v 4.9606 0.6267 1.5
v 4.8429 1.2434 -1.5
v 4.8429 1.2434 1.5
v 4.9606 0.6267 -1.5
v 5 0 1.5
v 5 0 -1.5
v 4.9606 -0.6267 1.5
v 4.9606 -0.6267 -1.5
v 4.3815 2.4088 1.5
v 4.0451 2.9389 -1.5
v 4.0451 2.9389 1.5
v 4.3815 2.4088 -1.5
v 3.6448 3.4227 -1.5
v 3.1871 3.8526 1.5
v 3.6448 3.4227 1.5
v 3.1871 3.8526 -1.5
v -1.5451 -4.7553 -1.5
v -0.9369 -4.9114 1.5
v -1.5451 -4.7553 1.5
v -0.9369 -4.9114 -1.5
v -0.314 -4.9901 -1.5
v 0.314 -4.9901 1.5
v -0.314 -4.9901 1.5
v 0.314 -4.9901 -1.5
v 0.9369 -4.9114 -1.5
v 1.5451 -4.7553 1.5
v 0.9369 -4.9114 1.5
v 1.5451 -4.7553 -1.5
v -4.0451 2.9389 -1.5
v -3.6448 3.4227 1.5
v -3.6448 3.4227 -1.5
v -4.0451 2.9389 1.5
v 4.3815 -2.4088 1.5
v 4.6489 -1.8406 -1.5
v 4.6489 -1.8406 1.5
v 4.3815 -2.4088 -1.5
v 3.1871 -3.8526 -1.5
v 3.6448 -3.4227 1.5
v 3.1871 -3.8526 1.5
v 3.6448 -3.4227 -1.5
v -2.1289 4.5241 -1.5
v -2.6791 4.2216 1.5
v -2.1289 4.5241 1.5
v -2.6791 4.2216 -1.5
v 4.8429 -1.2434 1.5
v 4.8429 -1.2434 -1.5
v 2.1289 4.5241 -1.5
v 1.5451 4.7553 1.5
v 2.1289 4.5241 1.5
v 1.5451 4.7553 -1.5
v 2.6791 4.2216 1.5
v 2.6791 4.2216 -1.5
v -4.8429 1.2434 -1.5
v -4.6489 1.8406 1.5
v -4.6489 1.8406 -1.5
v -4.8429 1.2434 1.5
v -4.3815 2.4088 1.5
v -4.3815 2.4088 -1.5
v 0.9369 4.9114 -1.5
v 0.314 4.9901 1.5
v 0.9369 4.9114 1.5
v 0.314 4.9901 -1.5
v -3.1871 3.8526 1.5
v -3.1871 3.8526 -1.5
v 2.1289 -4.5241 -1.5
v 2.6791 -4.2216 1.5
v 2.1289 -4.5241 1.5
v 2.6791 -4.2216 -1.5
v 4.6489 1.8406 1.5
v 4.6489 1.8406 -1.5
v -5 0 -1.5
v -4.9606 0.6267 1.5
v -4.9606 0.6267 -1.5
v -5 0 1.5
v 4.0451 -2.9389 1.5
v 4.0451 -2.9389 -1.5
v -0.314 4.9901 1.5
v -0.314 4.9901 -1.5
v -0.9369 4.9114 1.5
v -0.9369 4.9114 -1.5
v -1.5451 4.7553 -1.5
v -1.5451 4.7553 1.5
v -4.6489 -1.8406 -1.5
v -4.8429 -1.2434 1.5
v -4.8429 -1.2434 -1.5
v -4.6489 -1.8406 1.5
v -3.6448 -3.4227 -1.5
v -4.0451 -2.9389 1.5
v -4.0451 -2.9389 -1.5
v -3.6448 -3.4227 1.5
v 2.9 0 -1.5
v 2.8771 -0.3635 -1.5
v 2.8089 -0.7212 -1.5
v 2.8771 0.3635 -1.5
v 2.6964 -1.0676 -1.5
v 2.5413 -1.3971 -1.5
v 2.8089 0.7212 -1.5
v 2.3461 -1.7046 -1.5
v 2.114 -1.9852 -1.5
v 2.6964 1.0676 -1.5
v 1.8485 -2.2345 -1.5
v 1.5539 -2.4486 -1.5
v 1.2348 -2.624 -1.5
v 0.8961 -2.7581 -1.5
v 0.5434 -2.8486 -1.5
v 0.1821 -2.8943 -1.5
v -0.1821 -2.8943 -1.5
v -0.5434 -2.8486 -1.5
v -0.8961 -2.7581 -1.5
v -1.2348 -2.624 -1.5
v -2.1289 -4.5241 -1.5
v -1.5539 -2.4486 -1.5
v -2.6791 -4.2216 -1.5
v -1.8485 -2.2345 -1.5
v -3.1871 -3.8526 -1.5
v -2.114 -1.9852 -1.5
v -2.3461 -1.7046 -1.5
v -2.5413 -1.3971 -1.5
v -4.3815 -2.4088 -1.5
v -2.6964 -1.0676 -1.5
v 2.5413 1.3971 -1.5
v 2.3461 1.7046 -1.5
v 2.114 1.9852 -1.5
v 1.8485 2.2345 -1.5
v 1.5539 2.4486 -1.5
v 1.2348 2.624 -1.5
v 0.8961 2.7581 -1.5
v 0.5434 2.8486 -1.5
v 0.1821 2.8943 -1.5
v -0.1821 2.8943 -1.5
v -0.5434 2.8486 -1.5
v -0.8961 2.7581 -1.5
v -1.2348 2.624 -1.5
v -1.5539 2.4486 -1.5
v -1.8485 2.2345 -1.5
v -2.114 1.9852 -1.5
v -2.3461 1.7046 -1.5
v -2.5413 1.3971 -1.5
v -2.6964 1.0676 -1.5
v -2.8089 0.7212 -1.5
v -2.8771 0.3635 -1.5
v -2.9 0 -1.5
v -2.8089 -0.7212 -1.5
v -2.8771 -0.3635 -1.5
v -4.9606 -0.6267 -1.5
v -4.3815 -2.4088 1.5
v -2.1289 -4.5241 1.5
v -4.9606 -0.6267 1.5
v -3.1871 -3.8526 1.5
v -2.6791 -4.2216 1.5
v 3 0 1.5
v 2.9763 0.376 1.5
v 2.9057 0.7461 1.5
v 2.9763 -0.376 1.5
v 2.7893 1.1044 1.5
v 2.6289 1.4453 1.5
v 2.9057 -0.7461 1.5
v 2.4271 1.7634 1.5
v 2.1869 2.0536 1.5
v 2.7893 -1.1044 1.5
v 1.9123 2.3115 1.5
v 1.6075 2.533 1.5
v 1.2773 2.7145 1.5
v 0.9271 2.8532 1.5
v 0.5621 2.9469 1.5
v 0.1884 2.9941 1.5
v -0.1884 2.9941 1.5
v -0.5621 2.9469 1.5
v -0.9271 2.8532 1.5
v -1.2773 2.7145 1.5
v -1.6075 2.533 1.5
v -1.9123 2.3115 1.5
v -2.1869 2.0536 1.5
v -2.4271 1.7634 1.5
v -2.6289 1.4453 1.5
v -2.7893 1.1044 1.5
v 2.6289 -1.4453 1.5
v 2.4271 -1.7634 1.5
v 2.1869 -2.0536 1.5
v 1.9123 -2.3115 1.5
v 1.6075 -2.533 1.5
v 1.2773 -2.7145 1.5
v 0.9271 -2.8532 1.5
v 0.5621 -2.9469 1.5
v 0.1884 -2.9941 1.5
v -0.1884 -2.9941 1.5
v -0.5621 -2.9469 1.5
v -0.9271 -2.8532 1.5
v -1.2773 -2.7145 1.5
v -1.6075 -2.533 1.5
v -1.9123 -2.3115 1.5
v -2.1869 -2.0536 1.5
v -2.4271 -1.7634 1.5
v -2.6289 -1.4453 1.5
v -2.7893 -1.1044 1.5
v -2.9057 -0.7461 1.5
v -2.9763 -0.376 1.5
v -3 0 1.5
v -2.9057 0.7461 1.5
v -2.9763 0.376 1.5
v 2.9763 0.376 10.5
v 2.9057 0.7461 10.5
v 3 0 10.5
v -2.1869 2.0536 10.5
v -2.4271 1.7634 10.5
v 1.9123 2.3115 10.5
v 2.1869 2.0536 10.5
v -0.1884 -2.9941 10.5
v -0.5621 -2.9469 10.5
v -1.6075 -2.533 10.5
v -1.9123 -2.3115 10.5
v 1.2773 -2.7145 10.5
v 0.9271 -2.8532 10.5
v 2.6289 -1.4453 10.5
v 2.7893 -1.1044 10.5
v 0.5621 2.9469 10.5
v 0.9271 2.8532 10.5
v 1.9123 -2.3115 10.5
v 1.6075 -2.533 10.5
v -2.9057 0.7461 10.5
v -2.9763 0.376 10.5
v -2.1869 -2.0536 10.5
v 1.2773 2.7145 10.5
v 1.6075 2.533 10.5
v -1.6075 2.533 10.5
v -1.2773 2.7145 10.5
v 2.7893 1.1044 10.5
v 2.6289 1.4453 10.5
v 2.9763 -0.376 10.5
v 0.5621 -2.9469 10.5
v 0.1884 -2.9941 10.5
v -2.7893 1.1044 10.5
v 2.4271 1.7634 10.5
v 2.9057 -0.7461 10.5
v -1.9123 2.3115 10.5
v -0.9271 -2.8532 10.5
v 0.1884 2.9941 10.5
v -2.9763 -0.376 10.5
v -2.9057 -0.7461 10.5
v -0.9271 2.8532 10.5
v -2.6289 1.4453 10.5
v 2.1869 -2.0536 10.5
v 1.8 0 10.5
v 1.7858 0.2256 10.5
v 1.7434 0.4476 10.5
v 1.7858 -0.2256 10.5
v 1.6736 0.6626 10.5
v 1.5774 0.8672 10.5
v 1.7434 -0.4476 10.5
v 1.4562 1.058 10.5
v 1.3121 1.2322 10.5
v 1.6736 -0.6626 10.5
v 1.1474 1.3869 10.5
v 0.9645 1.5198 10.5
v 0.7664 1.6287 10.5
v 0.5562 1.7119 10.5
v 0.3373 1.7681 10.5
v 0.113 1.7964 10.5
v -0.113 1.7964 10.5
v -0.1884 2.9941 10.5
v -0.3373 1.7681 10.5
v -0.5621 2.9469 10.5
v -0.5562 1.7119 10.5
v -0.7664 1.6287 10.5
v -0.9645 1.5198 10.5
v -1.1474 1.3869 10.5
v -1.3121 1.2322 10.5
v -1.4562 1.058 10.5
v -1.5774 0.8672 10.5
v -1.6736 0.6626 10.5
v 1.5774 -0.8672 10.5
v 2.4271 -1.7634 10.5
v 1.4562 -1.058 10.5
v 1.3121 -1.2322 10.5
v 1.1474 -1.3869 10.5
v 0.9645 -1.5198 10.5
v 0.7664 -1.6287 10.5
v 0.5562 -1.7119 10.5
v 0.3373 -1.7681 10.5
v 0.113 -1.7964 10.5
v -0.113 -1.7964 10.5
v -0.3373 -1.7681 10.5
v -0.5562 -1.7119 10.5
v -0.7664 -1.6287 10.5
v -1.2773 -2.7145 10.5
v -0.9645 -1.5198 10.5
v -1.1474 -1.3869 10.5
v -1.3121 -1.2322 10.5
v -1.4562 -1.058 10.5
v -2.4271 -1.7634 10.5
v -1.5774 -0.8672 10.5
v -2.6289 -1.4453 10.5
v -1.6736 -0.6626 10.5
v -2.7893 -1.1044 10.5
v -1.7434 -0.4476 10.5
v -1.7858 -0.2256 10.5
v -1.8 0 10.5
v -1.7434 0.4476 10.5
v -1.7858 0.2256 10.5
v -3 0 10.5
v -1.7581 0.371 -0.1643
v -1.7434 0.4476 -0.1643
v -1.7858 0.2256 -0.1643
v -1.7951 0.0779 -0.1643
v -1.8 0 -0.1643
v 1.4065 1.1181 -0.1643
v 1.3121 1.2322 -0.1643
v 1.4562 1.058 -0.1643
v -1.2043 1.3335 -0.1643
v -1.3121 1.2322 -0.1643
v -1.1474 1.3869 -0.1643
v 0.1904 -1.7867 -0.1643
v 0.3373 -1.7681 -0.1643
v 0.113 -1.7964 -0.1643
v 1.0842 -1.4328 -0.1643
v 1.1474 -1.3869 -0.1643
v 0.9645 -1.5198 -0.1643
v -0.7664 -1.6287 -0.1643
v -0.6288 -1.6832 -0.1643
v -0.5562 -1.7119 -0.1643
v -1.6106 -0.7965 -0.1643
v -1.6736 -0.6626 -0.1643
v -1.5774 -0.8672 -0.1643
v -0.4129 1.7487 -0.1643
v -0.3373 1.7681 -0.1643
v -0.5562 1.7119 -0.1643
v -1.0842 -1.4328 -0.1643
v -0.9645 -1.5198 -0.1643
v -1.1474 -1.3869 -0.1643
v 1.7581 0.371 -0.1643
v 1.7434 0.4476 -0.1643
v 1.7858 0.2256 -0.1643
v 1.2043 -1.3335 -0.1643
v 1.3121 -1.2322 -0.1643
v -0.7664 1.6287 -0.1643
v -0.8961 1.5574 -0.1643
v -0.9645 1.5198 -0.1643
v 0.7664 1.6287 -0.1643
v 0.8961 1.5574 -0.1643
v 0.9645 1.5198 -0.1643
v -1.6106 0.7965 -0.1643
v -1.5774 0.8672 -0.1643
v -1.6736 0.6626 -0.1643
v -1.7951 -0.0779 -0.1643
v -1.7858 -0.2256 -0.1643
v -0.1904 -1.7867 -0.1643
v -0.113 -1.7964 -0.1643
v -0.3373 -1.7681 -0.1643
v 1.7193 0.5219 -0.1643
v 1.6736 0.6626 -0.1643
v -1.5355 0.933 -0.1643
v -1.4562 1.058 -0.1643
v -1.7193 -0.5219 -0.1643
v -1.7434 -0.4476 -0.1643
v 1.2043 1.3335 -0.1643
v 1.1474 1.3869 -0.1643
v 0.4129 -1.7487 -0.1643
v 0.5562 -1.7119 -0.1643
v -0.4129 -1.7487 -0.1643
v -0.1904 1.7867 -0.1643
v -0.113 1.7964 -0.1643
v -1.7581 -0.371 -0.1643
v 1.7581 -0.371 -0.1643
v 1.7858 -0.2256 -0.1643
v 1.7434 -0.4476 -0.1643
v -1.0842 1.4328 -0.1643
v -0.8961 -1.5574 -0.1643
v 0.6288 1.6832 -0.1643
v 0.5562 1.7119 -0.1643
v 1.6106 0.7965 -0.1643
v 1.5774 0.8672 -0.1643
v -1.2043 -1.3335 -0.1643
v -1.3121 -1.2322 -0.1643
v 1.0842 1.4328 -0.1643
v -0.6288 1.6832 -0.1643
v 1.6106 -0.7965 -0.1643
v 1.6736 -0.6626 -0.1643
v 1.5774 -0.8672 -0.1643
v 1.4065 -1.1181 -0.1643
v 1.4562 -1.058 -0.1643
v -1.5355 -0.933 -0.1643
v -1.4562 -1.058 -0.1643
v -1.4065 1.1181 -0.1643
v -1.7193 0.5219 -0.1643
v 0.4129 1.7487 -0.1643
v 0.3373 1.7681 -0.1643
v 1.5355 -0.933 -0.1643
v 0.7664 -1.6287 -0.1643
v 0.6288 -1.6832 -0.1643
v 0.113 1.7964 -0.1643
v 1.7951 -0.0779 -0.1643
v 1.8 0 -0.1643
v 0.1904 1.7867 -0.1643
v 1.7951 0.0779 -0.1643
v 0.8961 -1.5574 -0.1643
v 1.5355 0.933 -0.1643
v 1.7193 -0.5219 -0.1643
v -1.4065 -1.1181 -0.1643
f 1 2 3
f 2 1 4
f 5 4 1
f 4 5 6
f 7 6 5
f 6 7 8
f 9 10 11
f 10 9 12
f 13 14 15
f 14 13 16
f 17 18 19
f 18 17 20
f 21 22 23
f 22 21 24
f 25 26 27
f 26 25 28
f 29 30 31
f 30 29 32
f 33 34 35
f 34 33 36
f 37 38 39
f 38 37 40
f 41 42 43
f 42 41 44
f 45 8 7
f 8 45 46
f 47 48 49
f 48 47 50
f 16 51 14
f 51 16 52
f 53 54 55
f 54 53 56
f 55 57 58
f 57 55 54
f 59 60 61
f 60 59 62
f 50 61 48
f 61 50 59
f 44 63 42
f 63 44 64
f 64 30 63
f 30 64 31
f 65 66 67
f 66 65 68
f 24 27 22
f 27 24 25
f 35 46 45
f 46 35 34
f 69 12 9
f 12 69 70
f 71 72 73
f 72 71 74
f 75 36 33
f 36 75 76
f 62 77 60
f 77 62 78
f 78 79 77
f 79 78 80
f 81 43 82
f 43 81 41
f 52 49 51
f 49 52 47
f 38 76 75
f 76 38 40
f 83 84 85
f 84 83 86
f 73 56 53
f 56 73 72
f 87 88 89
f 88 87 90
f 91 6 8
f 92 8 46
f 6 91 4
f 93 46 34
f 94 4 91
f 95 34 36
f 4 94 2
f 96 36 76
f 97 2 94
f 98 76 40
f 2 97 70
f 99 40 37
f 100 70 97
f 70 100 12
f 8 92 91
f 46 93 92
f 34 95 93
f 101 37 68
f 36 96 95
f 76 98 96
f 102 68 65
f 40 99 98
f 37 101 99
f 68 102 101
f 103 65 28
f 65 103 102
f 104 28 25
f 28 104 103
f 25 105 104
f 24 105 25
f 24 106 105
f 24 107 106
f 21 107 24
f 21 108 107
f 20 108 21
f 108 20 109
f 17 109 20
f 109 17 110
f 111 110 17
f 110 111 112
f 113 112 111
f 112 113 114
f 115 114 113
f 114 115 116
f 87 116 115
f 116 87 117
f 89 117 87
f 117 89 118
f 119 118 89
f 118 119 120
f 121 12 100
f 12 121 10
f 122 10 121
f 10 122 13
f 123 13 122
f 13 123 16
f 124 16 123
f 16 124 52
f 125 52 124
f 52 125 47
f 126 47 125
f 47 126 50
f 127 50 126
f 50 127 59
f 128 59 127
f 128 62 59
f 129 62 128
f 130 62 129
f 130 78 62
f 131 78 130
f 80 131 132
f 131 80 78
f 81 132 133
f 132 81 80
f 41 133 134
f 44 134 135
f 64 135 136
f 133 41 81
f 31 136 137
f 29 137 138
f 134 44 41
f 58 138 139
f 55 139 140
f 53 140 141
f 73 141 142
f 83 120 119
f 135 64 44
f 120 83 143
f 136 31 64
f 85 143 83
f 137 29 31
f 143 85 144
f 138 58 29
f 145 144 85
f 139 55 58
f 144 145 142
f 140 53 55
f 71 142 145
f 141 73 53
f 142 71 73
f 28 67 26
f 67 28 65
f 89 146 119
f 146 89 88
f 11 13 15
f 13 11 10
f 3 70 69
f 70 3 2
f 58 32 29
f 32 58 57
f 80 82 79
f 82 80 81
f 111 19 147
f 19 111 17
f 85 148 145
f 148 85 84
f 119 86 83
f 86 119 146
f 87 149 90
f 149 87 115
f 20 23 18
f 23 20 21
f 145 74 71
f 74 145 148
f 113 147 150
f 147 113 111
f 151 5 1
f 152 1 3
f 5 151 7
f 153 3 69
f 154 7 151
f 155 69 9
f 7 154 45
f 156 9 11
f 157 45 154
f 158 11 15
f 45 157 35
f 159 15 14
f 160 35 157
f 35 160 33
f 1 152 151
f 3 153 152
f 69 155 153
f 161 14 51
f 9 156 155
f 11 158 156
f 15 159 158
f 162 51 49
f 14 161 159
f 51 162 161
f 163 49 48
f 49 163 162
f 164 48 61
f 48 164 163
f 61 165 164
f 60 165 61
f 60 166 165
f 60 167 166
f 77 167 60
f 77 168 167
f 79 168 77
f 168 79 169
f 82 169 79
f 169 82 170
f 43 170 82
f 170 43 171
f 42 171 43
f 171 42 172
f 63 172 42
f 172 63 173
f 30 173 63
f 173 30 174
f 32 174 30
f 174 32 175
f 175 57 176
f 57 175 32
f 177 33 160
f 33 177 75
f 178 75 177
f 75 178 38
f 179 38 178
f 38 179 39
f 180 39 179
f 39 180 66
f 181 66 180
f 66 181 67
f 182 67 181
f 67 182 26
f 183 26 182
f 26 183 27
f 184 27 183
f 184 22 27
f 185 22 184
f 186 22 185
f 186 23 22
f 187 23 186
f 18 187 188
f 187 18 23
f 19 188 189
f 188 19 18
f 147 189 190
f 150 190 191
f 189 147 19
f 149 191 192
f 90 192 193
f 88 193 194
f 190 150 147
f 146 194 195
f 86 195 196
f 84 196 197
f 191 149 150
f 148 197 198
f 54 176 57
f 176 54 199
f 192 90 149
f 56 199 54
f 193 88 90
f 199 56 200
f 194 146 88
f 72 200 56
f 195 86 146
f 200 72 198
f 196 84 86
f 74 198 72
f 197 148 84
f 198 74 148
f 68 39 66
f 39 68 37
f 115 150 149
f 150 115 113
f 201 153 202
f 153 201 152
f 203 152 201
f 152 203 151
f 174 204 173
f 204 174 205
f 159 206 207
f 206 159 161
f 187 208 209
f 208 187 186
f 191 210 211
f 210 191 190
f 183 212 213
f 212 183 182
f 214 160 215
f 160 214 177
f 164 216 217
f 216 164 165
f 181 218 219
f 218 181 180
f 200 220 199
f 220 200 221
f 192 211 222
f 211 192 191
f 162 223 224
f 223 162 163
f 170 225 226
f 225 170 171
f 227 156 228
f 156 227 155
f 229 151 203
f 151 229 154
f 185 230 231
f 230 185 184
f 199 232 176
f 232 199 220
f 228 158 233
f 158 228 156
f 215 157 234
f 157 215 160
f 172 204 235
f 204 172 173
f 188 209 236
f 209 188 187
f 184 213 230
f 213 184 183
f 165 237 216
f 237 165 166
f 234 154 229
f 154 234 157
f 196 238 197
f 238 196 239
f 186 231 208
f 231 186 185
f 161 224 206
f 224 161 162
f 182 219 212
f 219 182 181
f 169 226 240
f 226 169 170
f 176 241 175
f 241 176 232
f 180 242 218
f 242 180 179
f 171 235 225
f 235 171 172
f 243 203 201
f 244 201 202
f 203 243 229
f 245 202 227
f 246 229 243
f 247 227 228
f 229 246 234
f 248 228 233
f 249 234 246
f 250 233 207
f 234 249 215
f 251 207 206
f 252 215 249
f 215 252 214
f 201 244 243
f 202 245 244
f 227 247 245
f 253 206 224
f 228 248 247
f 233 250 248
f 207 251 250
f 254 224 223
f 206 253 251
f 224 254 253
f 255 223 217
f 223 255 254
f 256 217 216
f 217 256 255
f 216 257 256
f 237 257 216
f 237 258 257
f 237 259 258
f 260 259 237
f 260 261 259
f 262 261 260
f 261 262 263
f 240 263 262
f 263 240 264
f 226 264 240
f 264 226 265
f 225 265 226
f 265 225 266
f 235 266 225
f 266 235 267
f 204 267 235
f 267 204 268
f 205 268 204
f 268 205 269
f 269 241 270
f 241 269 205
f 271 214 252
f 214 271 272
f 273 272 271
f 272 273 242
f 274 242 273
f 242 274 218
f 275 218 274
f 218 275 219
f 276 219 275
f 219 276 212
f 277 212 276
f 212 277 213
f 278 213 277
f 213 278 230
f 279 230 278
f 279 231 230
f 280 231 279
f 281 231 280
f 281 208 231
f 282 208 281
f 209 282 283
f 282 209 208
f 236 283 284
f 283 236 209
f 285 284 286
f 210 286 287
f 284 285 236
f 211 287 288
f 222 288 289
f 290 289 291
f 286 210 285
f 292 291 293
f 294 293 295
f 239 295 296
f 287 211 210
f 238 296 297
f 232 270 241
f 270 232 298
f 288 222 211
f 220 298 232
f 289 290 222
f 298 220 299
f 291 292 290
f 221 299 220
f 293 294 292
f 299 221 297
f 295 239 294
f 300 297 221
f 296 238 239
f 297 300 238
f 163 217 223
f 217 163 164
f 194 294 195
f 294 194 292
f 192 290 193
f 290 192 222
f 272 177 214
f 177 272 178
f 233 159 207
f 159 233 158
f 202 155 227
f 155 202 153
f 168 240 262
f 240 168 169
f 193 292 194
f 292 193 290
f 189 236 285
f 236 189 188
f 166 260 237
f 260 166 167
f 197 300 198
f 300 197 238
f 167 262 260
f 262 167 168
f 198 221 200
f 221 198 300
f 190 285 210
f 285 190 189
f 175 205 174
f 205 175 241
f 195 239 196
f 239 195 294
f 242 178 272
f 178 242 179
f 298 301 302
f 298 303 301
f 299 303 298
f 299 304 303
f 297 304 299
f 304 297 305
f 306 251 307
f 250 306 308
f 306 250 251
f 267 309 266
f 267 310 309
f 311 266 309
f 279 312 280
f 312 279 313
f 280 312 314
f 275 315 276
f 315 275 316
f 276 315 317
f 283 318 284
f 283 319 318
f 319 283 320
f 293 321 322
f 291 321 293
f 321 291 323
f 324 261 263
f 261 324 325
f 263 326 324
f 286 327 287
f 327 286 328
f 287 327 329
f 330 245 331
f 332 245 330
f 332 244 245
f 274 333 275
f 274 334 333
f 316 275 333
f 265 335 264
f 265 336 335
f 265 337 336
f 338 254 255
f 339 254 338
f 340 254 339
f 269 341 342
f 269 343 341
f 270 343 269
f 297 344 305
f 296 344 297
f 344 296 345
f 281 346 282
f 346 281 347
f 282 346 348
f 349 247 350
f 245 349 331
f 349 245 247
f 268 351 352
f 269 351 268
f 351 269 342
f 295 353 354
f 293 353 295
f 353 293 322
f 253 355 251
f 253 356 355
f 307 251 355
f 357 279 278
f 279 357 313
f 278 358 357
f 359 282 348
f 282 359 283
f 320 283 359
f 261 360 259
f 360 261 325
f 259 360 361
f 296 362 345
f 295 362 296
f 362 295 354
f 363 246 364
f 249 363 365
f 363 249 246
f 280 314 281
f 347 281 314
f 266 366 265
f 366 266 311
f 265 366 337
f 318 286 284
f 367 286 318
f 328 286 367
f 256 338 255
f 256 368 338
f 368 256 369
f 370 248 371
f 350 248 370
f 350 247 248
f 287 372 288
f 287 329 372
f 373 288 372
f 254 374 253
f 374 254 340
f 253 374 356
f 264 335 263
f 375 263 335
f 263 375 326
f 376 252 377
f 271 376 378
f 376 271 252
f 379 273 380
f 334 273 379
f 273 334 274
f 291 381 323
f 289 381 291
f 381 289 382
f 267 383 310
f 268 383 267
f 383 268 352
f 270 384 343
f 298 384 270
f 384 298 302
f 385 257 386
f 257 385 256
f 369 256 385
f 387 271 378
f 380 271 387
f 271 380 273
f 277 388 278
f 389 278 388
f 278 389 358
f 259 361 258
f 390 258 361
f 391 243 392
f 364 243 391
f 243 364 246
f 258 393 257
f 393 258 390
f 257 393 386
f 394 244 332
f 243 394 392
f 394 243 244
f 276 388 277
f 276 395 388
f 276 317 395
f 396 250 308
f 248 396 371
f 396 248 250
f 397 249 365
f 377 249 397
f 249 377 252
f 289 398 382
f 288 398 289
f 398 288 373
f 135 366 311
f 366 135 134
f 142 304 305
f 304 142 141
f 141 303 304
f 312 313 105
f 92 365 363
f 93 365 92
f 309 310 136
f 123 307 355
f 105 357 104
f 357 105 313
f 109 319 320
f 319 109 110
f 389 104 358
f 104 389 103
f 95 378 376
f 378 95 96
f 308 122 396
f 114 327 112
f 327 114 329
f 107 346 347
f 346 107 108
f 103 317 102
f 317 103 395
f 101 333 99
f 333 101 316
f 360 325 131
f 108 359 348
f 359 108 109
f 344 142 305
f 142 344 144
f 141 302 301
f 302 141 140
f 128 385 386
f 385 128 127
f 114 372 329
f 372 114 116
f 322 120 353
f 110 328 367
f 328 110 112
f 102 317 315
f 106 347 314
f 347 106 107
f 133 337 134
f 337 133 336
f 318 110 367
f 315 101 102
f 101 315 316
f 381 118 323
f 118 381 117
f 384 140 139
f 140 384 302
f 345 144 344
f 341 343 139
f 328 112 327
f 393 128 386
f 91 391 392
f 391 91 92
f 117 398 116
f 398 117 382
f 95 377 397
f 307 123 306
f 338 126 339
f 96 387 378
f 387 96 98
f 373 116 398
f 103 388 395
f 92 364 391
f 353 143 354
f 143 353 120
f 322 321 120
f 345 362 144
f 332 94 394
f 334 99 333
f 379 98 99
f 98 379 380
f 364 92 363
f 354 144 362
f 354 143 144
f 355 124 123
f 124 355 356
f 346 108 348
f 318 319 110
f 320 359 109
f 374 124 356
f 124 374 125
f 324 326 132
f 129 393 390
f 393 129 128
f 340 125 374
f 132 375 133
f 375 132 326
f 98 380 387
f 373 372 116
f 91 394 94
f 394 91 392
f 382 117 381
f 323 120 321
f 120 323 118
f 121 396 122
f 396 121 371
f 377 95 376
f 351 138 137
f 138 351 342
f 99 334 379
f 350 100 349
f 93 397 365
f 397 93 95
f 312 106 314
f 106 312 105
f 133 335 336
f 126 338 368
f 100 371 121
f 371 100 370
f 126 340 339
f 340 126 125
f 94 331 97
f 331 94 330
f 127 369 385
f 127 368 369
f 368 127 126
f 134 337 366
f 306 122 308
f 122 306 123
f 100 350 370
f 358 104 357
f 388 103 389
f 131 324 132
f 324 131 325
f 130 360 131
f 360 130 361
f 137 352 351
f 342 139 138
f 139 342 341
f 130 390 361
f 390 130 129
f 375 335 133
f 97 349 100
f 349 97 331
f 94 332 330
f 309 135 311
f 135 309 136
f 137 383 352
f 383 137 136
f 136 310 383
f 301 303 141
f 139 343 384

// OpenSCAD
$fn = 50;


difference() {
	union() {
		translate(v = [0, 0, -1.5000000000]) {
			cylinder(h = 3, r = 5.0000000000);
		}
		translate(v = [0, 0, -1.5000000000]) {
			cylinder(h = 12, r = 3.0000000000);
		}
	}
	union() {
		translate(v = [0, 0, -1.5000000000]) {
			rotate(a = [0, 180, 0]) {
				difference() {
					union() {
						translate(v = [0, 0, -12.0000000000]) {
							cylinder(h = 12, r = 1.5000000000);
						}
						translate(v = [0, 0, -12.0000000000]) {
							cylinder(h = 12, r = 1.8000000000);
						}
						translate(v = [0, 0, -1.7000000000]) {
							cylinder(h = 1.7000000000, r1 = 1.5000000000, r2 = 2.9000000000);
						}
						translate(v = [0, 0, -12.0000000000]) {
							cylinder(h = 12, r = 1.5000000000);
						}
					}
					union();
				}
			}
		}
		translate(v = [0, 0, -100.0000000000]) {
			cylinder(h = 200, r = 1.5000000000);
		}
	}
}
